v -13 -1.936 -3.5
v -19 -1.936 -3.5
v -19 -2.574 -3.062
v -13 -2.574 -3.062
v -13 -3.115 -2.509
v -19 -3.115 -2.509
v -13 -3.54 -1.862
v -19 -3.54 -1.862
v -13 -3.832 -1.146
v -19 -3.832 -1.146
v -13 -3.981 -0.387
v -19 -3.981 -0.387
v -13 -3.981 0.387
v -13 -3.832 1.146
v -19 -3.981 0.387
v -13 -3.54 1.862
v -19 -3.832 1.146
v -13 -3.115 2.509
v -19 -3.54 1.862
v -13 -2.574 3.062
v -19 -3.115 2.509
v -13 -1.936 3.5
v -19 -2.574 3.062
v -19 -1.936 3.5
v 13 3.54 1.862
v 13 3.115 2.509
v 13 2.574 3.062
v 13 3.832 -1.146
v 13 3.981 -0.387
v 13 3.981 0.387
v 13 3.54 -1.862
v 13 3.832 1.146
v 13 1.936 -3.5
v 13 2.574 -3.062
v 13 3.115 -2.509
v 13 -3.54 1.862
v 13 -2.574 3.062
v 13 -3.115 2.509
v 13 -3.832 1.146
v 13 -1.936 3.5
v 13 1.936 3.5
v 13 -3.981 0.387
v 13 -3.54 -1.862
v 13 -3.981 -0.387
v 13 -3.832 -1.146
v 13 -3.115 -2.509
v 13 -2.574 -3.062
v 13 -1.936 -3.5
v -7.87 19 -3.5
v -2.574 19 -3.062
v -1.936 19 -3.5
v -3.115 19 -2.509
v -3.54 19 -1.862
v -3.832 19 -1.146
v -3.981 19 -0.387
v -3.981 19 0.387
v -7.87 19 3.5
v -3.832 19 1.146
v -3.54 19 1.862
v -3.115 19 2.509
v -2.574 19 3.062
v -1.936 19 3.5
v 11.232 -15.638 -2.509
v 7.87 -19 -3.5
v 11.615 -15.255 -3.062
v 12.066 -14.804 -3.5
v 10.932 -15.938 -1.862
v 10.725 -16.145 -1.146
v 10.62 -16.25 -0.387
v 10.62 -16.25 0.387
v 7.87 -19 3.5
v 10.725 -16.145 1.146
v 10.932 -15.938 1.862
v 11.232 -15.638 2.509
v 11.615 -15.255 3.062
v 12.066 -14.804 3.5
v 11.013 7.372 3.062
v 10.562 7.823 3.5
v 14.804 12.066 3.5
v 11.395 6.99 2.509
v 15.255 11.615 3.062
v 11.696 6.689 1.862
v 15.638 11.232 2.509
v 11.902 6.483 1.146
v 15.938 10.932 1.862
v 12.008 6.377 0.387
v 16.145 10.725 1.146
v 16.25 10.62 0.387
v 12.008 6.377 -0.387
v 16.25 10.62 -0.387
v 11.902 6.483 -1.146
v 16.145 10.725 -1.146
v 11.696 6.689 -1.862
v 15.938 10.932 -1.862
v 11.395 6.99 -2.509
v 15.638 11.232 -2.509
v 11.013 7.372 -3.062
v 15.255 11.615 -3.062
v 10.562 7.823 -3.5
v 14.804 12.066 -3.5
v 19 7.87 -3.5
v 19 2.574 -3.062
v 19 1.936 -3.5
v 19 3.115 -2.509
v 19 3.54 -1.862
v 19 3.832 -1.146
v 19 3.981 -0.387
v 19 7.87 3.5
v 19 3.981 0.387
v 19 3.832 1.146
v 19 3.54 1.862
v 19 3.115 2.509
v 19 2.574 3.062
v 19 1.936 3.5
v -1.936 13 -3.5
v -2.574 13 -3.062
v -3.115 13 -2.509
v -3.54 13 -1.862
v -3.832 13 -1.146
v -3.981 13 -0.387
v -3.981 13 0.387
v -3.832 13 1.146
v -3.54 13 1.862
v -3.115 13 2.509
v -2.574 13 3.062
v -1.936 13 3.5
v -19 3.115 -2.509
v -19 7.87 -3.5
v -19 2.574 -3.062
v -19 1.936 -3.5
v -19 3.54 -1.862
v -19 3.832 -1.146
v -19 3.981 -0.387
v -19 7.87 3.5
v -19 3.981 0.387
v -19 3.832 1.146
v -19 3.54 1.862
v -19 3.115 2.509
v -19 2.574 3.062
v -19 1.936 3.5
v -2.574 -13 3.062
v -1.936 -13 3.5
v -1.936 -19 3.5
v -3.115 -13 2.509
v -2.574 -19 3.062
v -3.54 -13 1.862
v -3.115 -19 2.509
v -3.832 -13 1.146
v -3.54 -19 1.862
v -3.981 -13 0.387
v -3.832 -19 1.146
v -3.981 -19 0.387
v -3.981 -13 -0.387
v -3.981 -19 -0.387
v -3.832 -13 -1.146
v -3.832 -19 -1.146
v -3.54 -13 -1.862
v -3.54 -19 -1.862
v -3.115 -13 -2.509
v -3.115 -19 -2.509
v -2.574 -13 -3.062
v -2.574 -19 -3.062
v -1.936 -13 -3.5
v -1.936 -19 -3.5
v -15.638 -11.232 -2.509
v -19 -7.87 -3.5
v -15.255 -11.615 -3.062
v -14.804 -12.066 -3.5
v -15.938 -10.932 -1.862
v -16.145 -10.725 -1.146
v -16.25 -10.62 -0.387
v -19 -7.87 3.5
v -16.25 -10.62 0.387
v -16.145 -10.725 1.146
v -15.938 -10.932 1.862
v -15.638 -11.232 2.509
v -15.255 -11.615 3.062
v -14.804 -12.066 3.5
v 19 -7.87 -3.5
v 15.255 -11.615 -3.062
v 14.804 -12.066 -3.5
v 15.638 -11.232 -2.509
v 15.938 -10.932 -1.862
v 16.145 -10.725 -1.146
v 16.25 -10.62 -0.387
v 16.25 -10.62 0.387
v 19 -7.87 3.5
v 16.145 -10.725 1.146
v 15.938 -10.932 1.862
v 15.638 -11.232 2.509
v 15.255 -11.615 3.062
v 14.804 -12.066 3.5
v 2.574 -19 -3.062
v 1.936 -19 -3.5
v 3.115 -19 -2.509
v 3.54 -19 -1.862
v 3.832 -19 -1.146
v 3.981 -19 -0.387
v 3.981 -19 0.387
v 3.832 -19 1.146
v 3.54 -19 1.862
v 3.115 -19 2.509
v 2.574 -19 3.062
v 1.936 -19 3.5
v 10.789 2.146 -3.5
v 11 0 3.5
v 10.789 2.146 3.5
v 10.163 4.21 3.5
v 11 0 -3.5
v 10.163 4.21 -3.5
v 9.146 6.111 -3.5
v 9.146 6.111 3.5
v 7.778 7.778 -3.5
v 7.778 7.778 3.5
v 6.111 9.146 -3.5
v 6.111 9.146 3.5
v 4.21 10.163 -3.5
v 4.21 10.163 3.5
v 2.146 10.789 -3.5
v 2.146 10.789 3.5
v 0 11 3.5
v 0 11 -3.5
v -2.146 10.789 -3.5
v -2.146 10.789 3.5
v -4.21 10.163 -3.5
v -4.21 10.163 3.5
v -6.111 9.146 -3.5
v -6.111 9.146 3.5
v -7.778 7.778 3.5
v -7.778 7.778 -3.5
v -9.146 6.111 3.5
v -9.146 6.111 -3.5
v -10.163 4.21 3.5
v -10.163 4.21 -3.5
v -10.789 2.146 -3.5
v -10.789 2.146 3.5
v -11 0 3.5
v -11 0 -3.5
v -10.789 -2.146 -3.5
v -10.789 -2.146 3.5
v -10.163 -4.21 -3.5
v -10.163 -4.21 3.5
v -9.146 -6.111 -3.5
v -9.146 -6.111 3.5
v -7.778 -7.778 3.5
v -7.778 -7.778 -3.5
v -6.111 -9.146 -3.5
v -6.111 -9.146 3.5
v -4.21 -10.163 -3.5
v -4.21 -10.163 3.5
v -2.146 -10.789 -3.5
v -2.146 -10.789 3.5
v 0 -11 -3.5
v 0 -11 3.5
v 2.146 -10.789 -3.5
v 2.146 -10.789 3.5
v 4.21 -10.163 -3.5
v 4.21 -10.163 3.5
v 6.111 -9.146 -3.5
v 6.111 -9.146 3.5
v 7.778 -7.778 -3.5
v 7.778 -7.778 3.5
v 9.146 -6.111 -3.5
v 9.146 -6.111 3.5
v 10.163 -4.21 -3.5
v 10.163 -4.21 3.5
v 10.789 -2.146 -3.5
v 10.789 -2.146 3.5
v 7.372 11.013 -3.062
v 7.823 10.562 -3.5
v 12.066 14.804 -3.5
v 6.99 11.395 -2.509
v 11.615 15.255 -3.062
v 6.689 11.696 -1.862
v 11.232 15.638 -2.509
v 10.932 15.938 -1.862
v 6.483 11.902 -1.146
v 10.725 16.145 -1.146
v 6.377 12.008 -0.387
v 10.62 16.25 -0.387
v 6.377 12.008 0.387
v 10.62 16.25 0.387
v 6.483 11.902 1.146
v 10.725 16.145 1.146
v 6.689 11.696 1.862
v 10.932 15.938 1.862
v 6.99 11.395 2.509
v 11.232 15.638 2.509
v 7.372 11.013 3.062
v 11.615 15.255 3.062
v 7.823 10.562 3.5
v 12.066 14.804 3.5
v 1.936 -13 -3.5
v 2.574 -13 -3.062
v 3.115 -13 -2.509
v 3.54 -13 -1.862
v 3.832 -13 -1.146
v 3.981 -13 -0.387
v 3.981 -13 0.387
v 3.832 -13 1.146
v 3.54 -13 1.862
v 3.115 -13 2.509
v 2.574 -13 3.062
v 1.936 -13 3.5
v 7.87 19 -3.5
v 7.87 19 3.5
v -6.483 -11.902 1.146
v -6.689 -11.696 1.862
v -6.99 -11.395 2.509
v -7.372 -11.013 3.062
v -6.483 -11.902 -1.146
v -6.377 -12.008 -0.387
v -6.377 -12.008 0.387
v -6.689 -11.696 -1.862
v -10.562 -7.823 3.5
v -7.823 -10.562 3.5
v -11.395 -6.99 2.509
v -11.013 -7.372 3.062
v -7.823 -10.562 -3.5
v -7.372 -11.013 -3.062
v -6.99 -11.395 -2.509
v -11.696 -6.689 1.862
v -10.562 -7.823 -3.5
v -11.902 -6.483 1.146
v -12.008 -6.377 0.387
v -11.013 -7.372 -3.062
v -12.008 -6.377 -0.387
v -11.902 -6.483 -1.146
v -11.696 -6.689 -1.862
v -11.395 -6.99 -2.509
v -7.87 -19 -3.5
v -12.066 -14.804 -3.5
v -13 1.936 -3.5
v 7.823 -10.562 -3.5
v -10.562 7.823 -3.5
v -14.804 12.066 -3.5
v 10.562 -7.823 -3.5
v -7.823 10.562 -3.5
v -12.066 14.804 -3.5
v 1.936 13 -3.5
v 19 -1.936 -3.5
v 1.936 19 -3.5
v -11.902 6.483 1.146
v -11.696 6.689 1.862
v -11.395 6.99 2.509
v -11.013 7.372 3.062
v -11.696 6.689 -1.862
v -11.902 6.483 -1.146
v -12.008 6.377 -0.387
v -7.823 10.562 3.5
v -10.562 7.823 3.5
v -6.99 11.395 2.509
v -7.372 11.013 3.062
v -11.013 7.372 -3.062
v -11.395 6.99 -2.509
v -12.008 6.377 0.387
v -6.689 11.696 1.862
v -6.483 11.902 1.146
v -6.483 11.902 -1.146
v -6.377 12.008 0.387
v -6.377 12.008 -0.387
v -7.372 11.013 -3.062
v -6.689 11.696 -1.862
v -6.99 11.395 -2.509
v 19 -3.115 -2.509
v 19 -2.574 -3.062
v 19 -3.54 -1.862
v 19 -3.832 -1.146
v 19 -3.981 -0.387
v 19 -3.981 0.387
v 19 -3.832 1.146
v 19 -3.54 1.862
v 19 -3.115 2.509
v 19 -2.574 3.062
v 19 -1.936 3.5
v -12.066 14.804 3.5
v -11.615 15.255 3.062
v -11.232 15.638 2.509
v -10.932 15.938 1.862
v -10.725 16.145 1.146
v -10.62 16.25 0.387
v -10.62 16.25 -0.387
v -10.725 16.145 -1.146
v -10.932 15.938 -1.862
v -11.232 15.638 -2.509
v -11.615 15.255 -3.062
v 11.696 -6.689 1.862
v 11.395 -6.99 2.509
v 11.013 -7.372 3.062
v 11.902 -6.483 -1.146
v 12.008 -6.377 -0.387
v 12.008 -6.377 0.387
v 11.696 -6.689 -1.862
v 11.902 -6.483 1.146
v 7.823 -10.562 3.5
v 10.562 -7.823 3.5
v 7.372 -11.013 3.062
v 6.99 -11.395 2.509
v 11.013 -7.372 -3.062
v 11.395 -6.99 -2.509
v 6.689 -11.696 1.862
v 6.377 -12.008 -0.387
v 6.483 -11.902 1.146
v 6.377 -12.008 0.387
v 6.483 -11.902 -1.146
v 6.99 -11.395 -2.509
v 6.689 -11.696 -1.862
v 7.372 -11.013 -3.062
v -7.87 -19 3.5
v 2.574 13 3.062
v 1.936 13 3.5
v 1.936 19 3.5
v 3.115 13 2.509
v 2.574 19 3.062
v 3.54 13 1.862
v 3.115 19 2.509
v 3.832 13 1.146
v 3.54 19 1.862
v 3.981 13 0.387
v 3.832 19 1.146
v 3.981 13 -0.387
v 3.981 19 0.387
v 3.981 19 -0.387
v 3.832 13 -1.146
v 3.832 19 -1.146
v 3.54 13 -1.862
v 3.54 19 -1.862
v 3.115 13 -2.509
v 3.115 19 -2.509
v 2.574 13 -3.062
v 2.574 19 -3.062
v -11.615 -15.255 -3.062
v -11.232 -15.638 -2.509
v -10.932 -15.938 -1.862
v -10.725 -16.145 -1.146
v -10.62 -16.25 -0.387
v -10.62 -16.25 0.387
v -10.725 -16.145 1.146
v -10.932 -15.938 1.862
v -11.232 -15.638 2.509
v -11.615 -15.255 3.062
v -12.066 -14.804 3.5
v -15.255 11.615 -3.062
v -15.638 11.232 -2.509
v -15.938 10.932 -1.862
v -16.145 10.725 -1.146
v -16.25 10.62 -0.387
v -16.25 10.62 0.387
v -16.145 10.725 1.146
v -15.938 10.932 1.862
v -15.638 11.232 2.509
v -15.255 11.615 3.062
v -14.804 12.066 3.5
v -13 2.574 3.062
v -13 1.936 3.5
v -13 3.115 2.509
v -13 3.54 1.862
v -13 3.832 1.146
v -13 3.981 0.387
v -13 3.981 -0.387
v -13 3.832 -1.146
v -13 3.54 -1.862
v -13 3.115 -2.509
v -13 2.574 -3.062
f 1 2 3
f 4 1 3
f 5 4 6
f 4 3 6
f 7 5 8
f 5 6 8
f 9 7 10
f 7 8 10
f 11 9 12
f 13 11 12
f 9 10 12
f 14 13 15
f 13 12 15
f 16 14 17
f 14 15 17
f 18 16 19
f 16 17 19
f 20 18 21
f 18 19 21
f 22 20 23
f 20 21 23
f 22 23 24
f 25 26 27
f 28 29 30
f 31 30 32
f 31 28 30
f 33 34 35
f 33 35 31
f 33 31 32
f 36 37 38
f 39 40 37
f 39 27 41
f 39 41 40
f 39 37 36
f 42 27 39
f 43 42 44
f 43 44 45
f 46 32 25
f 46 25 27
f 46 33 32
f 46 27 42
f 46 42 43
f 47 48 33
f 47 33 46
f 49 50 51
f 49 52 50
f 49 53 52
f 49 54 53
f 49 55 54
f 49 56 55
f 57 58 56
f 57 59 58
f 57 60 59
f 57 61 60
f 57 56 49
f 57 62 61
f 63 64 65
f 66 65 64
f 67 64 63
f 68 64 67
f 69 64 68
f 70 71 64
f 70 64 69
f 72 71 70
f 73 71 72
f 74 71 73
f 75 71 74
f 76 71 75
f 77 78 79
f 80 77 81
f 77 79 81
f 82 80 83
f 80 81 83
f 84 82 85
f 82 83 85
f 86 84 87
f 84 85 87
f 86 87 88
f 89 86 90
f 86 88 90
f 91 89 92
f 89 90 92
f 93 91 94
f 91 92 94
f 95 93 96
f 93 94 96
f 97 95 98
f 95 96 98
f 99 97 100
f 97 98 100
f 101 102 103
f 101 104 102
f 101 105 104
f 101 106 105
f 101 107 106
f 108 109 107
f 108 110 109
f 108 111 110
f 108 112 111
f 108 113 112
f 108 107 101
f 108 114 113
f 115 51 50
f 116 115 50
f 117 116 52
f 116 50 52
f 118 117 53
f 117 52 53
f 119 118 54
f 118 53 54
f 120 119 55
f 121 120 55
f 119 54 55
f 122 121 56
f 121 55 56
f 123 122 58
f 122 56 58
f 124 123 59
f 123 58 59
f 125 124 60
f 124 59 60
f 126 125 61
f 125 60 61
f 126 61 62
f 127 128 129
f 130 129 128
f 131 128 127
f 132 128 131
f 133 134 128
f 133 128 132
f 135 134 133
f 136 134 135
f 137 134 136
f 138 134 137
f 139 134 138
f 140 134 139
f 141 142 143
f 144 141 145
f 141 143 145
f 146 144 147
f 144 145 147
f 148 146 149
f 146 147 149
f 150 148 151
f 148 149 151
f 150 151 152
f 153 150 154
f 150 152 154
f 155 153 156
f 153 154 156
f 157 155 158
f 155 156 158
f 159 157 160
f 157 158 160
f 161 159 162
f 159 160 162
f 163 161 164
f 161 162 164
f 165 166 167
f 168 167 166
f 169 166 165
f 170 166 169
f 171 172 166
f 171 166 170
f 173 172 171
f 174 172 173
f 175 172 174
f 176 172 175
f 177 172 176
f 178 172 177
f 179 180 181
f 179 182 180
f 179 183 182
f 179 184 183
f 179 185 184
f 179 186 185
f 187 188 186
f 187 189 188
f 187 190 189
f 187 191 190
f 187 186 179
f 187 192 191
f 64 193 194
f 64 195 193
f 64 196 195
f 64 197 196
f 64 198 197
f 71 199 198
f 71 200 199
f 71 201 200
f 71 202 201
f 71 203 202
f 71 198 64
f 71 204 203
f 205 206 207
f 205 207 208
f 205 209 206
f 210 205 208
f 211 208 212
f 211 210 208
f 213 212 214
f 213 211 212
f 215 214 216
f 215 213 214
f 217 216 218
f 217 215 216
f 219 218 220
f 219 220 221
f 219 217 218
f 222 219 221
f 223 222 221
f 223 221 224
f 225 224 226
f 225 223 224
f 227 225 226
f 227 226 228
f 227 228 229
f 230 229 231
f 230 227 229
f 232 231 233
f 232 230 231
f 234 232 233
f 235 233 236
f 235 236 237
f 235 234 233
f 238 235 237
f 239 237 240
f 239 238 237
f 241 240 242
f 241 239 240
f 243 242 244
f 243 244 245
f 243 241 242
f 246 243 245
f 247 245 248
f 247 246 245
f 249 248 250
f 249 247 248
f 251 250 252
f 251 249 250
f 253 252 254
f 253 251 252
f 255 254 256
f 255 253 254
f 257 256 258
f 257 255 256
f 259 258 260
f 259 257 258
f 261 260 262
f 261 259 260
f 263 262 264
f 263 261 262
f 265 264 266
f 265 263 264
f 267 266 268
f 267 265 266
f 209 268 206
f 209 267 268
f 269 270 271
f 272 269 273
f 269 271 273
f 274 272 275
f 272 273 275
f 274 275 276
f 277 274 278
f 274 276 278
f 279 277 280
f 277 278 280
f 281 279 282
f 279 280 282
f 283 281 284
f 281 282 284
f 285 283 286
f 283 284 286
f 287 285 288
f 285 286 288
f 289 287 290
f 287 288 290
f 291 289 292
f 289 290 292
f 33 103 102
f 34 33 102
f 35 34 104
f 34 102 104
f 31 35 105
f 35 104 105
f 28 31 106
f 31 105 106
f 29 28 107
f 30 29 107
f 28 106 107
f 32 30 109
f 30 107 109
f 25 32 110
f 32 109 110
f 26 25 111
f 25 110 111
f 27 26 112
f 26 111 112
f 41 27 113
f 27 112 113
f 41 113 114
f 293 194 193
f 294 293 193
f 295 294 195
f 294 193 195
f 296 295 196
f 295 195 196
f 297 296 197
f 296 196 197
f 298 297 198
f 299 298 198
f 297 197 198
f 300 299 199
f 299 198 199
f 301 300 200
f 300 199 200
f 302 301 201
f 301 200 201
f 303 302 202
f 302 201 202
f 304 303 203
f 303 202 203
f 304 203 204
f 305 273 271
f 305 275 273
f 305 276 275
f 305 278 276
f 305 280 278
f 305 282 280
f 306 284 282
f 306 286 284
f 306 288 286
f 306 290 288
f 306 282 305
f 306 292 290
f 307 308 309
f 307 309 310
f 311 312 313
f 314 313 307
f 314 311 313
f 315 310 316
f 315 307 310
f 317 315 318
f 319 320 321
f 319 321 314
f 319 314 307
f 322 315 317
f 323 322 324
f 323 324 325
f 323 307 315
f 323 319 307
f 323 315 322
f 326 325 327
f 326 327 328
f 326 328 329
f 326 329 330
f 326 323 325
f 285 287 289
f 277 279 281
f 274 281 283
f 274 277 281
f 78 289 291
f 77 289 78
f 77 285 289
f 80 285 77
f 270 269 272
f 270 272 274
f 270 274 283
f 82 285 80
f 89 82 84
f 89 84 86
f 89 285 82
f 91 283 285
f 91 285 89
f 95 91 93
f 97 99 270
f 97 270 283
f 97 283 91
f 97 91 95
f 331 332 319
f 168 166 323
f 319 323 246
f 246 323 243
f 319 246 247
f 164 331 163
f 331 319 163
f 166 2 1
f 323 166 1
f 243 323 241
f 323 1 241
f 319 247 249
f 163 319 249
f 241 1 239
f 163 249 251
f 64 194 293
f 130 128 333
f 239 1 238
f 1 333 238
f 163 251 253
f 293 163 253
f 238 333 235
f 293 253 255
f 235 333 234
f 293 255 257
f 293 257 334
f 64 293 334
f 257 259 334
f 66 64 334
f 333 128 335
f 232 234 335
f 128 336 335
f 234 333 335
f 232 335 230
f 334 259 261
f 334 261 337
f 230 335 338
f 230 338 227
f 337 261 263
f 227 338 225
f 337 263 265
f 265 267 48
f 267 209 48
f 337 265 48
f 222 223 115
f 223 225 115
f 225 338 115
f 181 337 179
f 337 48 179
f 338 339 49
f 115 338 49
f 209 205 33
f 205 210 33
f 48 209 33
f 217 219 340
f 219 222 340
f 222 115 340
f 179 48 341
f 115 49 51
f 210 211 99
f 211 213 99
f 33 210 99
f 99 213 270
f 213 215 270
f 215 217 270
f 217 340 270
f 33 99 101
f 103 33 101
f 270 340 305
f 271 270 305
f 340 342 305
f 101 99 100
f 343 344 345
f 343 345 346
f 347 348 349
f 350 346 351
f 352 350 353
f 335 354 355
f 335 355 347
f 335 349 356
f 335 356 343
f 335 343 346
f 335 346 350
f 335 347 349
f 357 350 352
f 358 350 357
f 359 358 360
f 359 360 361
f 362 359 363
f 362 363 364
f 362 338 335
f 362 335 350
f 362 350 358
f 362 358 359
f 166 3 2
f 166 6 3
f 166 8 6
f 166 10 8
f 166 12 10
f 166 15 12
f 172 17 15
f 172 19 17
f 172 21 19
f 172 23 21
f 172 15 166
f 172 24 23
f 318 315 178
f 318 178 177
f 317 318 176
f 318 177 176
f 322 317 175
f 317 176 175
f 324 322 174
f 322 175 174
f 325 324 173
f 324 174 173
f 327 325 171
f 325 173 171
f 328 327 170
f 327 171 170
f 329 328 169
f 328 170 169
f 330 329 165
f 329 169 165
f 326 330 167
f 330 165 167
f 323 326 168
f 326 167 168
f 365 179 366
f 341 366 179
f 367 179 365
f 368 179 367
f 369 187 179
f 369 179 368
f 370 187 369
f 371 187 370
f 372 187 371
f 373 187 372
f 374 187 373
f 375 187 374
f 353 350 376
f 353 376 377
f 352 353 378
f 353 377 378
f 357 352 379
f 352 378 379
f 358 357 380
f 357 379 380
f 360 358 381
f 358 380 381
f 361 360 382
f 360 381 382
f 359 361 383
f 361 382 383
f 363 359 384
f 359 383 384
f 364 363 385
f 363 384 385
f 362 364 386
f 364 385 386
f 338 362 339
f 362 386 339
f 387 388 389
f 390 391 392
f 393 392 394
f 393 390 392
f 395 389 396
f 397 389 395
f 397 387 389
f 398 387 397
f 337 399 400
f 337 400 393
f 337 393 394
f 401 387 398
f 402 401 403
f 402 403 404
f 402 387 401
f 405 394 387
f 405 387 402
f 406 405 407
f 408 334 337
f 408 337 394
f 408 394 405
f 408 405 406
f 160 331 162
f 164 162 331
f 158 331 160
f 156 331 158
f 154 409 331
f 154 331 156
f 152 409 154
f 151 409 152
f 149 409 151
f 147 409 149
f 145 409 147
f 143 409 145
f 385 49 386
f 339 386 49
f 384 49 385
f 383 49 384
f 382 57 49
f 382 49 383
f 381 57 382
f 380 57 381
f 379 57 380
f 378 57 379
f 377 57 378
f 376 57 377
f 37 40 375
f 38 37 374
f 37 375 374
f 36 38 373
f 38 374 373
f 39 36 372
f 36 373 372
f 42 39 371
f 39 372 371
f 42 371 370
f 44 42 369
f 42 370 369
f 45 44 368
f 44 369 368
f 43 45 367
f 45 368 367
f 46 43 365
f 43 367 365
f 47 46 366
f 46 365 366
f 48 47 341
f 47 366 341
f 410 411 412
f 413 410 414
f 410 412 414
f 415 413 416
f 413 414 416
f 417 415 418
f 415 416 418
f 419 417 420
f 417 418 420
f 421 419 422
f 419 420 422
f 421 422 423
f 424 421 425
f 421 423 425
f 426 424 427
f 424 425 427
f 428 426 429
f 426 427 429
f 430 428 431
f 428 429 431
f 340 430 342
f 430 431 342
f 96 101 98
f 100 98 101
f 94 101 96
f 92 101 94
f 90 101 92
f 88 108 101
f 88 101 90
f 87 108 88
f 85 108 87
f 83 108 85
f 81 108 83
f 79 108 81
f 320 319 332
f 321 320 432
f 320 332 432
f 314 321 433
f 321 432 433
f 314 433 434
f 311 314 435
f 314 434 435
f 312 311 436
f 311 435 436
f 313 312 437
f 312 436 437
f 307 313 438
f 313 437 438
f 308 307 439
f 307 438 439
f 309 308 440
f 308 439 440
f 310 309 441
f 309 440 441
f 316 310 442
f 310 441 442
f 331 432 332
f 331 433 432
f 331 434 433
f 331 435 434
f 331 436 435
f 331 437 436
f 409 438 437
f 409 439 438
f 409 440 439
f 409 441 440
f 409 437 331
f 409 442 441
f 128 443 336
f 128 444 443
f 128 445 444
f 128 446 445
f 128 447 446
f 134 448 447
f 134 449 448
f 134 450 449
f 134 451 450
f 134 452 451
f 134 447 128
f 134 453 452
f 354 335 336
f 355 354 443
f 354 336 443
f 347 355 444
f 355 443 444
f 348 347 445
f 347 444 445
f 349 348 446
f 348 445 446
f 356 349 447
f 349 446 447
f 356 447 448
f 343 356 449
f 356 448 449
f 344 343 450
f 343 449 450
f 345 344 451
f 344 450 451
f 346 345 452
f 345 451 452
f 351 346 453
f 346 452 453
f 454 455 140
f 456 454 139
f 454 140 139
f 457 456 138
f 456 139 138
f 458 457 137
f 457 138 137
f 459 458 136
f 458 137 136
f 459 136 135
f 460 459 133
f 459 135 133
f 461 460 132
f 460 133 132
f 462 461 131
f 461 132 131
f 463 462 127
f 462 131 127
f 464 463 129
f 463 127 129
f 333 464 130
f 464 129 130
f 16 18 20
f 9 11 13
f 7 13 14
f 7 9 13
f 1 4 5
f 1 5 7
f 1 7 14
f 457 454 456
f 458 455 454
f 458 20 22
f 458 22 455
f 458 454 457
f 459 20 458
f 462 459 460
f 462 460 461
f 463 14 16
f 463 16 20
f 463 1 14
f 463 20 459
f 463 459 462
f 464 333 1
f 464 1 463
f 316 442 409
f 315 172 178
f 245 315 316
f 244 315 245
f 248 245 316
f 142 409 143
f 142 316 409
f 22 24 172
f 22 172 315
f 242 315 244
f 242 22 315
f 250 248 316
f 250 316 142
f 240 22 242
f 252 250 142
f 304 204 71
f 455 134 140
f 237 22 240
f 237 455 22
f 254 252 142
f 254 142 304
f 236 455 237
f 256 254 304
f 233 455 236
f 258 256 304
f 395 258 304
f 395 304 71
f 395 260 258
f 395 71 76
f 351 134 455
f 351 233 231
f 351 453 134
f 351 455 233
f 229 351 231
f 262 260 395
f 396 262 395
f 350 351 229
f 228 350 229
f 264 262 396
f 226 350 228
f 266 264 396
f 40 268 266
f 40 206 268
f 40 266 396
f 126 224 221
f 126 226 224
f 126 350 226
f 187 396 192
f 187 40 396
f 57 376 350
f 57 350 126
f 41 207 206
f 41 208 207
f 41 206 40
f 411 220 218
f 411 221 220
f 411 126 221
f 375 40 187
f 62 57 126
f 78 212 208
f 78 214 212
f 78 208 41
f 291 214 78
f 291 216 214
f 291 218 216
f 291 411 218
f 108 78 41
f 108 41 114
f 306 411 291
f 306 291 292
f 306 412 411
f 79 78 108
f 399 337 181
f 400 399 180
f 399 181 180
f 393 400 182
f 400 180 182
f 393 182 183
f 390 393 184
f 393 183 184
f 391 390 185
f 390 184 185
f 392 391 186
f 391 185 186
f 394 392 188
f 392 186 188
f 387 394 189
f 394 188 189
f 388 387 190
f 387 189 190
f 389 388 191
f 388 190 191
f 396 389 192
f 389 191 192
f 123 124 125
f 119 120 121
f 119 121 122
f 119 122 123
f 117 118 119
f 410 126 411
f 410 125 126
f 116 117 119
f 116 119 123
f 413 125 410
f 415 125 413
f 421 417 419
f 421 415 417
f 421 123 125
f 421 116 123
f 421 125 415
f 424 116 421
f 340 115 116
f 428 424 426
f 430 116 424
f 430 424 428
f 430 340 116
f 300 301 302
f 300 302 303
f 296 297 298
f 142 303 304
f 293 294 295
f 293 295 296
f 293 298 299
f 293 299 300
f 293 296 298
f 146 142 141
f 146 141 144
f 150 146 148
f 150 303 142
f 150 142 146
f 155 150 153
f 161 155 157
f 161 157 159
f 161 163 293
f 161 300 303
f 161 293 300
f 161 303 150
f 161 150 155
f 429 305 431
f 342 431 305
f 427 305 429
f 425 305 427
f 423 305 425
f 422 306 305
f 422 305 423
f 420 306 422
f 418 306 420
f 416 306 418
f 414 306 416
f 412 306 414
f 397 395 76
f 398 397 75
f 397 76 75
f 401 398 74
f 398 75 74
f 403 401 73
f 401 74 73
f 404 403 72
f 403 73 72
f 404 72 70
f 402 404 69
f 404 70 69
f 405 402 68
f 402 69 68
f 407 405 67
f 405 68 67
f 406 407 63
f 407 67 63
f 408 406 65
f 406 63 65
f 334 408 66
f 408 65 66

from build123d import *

# Parameters (mm, degrees)
SKETCH1_R           = 11
BOSS_EXTRUDE1_DEPTH = 3.5
SKETCH2_R           = 4
CUT_EXTRUDE3_DEPTH  = 6
CIRPATTERN1_COUNT   = 8


with BuildPart() as part:
    # Sketch1 → Boss-Extrude1 (new, symmetric)
    with BuildSketch(Plane.XY):
        Polygon((7.870057685, 19), (-7.870057685, 19), (-19, 7.870057685), (-19, -7.870057685), (-7.870057685, -19), (7.870057685, -19), (19, -7.870057685), (19, 7.870057685), align=None)
        Circle(SKETCH1_R, mode=Mode.SUBTRACT)
    extrude(amount=BOSS_EXTRUDE1_DEPTH, both=True)

    # Sketch2 → Cut-Extrude3 (cut)
    with BuildSketch(Plane(origin=(0, -19, 0), x_dir=(-1, 0, 0), z_dir=(0, -1, 0))):
        Circle(SKETCH2_R)
    cut_extrude3 = extrude(amount=-CUT_EXTRUDE3_DEPTH, mode=Mode.SUBTRACT)

    # CirPattern1: Cut-Extrude3 ×8 about axis
    cirpattern1_axis = Axis((0, 0, 3.5), (0, 0, 1))
    for i in range(1, CIRPATTERN1_COUNT):
        add(cut_extrude3.rotate(cirpattern1_axis, i * 360 / CIRPATTERN1_COUNT), mode=Mode.SUBTRACT)


solid = part.part
